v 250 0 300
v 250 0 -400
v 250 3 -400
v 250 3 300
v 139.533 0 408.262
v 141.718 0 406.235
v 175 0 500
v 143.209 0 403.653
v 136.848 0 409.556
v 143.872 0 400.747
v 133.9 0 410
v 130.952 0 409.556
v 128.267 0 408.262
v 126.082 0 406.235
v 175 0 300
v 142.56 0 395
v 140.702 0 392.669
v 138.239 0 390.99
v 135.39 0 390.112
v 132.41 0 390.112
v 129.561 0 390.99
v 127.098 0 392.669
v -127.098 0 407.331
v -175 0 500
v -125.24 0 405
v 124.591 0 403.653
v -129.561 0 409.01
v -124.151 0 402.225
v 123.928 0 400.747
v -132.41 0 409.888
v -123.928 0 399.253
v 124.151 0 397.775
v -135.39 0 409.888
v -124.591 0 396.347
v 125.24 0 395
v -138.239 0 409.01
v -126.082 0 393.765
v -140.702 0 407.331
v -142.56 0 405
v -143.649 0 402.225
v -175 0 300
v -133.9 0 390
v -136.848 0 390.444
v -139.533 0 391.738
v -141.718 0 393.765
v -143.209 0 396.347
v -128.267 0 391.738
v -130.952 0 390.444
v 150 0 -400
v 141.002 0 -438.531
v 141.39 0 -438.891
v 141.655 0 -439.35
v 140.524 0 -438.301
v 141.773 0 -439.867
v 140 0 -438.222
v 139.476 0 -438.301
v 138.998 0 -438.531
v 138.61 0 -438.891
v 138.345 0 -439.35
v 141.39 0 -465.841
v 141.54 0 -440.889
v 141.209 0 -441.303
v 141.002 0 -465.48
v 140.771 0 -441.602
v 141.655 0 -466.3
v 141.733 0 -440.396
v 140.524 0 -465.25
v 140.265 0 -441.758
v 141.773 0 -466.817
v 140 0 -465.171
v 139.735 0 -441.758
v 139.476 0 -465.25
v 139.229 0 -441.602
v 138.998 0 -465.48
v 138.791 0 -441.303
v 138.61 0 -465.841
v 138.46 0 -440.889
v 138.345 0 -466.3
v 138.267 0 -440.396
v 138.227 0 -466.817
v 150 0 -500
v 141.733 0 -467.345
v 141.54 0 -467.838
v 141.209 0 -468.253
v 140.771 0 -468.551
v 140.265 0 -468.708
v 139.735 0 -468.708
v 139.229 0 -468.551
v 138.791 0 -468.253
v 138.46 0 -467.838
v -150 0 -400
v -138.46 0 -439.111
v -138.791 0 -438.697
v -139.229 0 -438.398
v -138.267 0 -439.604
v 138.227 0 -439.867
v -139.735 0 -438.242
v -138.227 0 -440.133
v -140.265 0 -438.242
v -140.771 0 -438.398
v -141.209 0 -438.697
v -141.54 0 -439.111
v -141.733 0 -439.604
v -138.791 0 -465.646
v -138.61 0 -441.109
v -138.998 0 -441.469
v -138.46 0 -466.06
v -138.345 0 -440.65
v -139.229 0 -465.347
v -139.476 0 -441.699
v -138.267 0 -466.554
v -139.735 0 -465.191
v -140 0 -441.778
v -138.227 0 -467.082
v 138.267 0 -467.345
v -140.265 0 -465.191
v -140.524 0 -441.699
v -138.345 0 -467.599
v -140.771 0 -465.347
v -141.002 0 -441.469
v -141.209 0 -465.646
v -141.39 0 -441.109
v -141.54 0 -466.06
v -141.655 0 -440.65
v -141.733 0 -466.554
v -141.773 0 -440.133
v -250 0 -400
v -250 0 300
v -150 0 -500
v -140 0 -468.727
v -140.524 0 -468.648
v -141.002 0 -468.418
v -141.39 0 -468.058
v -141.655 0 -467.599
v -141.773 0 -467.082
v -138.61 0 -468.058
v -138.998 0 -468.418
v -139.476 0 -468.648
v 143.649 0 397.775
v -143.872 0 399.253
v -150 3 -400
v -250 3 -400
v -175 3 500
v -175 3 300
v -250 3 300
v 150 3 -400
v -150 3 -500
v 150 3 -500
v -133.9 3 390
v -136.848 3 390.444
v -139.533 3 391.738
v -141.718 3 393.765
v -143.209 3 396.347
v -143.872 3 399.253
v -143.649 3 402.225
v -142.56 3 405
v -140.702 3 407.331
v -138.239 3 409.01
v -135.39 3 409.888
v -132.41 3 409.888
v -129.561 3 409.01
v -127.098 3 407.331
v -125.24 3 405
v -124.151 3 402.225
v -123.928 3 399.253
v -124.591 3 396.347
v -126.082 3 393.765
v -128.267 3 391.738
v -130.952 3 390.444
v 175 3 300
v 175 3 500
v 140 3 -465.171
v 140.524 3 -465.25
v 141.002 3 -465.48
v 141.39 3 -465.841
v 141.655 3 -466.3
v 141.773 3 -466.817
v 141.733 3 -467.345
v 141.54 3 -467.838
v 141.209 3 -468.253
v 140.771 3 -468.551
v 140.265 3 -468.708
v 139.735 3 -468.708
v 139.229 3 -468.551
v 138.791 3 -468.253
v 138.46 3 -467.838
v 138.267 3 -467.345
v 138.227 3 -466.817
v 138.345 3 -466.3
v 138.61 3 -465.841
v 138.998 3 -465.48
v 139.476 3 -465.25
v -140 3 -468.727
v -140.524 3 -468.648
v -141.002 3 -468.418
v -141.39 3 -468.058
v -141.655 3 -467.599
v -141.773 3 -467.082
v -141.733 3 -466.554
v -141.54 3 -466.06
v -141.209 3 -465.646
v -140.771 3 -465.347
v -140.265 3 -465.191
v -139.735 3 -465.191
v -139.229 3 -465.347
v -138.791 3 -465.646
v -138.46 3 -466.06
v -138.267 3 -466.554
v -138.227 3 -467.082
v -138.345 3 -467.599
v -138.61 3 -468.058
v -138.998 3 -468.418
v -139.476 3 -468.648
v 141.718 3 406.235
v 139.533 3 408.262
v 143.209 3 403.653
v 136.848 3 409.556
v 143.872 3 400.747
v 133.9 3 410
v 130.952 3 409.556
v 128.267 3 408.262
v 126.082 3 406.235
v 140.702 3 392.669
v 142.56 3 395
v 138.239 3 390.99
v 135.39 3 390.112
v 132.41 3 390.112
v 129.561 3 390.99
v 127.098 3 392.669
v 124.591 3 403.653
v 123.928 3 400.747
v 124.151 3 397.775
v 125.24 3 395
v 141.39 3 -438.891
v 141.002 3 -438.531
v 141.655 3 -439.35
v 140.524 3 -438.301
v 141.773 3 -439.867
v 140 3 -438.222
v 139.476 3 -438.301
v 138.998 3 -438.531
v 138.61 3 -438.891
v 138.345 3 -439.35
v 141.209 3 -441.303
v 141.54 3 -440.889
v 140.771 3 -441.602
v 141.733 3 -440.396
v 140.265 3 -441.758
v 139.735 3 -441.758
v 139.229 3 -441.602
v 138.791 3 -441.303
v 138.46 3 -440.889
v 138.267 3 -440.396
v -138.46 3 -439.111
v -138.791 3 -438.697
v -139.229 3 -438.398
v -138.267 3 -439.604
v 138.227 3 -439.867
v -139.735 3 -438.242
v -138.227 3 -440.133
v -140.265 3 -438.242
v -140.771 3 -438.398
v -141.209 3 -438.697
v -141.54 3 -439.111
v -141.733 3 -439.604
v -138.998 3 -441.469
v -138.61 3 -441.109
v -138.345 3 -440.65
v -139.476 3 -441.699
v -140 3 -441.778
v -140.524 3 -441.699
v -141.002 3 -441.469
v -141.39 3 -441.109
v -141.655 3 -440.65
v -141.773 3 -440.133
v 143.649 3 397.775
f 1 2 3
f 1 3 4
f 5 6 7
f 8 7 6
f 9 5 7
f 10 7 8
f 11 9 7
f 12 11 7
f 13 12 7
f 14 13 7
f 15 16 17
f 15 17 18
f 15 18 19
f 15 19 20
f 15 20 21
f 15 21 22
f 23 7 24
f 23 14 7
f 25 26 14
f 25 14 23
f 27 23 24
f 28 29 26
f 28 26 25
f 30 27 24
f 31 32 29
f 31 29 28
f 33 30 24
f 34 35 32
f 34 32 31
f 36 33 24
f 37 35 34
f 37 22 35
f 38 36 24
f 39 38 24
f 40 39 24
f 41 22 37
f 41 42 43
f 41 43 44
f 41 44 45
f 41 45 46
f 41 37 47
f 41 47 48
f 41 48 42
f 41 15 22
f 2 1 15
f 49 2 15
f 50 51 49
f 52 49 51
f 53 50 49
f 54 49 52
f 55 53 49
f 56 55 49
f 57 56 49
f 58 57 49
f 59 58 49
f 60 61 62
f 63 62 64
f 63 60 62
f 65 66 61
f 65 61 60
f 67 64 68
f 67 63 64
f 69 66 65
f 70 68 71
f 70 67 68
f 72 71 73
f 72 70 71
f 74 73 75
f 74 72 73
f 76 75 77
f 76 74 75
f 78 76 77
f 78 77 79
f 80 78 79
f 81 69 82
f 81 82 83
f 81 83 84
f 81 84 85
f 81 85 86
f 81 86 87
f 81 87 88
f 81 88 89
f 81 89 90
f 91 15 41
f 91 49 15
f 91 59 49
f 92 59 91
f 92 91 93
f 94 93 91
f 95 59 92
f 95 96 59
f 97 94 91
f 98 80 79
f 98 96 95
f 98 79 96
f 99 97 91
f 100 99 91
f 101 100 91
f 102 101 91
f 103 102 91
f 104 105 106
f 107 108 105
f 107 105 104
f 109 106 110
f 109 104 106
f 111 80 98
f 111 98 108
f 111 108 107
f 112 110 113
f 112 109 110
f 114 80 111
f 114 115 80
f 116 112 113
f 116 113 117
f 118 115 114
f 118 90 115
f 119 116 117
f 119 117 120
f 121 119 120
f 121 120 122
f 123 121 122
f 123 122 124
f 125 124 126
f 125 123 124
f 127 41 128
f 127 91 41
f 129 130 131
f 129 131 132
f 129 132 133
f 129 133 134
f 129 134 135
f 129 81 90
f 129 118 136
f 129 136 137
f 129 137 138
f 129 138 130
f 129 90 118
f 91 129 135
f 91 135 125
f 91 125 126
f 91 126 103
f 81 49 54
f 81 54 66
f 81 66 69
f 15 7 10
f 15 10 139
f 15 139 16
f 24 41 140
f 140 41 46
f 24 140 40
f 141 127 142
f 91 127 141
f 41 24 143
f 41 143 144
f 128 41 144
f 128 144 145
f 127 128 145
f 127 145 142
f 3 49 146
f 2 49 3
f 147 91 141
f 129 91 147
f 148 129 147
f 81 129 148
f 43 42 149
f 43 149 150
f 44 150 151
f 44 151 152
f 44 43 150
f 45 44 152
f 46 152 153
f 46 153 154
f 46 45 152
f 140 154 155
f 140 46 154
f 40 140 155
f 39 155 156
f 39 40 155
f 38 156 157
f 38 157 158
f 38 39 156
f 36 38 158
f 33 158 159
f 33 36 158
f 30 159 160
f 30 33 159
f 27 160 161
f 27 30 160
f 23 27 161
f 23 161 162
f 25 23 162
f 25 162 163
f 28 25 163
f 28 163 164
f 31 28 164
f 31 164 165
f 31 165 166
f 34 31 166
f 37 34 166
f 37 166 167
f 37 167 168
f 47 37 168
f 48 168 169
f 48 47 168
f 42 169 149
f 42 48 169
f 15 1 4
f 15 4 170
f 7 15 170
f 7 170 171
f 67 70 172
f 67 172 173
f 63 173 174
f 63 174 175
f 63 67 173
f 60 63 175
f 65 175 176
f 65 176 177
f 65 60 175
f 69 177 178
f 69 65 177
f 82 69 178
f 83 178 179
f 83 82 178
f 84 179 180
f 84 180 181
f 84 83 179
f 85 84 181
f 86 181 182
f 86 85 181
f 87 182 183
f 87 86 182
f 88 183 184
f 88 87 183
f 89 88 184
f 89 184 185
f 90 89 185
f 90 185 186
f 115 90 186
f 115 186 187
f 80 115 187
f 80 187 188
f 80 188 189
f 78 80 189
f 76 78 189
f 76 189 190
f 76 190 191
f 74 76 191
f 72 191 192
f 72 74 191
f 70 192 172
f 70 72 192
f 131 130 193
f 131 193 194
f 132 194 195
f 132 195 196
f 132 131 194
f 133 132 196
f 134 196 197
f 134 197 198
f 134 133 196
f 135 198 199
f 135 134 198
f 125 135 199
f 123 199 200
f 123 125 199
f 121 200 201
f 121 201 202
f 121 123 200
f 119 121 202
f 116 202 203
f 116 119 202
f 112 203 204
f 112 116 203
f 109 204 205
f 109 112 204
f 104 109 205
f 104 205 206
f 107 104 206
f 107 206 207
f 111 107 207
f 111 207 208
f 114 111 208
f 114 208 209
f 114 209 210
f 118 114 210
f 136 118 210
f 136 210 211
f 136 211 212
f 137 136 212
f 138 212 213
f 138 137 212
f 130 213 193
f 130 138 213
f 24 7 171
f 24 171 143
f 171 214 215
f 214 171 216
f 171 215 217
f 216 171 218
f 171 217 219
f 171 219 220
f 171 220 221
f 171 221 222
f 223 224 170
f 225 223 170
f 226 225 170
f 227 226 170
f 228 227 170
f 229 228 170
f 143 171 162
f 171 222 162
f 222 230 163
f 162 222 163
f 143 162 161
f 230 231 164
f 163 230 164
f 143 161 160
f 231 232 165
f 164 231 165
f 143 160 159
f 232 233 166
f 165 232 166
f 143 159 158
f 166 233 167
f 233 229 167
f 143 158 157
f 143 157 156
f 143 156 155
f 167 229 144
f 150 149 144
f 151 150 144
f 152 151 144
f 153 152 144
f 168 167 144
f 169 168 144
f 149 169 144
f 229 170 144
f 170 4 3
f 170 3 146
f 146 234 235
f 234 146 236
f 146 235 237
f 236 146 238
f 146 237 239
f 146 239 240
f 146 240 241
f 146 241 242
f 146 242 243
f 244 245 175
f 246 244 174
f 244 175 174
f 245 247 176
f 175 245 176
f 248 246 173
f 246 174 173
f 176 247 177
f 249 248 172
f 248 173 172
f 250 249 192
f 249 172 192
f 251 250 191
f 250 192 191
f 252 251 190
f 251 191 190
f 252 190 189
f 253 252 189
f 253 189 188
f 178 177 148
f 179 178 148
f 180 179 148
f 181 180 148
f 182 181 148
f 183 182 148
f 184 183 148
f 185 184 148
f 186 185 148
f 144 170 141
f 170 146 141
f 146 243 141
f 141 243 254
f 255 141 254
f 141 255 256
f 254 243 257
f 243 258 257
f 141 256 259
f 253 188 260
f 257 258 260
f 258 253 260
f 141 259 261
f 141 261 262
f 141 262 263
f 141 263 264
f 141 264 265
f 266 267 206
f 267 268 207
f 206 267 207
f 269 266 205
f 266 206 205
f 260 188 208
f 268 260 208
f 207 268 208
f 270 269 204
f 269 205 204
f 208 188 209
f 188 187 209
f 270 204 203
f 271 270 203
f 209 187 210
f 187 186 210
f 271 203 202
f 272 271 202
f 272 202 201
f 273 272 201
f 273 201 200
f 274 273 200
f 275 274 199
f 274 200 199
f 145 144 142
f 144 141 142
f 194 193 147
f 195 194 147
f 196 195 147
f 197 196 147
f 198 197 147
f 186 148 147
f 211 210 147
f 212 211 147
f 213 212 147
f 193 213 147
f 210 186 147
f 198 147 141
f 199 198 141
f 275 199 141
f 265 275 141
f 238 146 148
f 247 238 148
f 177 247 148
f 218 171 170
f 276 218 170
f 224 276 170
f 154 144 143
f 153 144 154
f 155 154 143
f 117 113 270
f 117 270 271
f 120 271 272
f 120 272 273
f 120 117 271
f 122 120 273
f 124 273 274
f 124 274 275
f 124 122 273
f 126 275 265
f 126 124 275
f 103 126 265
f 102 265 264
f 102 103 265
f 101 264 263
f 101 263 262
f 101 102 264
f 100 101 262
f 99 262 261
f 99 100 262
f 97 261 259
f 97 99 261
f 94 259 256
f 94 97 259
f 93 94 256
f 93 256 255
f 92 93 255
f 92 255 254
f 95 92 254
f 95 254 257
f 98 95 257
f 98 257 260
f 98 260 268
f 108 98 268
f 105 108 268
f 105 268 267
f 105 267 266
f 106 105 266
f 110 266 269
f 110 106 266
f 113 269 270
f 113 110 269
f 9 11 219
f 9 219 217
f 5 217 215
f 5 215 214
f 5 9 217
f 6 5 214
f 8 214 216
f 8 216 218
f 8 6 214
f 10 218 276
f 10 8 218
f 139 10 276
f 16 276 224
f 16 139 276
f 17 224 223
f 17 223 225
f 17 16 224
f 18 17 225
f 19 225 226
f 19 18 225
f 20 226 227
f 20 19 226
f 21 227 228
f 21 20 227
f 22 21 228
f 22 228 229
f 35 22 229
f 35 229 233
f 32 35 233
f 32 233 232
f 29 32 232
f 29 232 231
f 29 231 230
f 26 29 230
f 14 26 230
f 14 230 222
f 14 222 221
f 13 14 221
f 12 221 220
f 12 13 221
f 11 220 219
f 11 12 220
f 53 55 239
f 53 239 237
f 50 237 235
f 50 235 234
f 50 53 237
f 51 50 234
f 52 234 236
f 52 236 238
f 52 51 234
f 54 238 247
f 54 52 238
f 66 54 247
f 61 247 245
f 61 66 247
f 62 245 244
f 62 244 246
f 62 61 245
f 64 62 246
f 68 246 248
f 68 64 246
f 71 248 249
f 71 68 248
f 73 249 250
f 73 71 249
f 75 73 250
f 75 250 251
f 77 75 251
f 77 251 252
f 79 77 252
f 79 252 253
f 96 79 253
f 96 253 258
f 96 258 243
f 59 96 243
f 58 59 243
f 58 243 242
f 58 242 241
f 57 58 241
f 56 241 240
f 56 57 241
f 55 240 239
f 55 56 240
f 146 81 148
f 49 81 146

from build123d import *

# Parameters (mm, degrees)
SKETCH1_R           = 10
SKETCH1_R_2         = 1.778
BOSS_EXTRUDE1_DEPTH = 3


with BuildPart() as part:
    # Sketch1 → Boss-Extrude1 (new body)
    with BuildSketch(Plane(origin=(0, 0, 0), x_dir=(1, 0, 0), z_dir=(0, 1, 0))):
        Polygon((-250, -300), (-250, 400), (-150, 400), (-150, 500), (150, 500), (150, 400), (250, 400), (250, -300), (175, -300), (175, -500), (-175, -500), (-175, -300), align=None)
        with Locations(Location((133.9, -400, 0), (0, 0, 270))):
            Circle(SKETCH1_R, mode=Mode.SUBTRACT)
        with Locations(Location((-133.9, -400, 0), (0, 0, 90))):
            Circle(SKETCH1_R, mode=Mode.SUBTRACT)
        with Locations(Location((140, 466.9494, 0), (0, 0, 270))):
            Circle(SKETCH1_R_2, mode=Mode.SUBTRACT)
        with Locations(Location((140, 440, 0), (0, 0, 270))):
            Circle(SKETCH1_R_2, mode=Mode.SUBTRACT)
        with Locations(Location((-140, 466.9494, 0), (0, 0, 90))):
            Circle(SKETCH1_R_2, mode=Mode.SUBTRACT)
        with Locations(Location((-140, 440, 0), (0, 0, 90))):
            Circle(SKETCH1_R_2, mode=Mode.SUBTRACT)
    extrude(amount=BOSS_EXTRUDE1_DEPTH)


solid = part.part
